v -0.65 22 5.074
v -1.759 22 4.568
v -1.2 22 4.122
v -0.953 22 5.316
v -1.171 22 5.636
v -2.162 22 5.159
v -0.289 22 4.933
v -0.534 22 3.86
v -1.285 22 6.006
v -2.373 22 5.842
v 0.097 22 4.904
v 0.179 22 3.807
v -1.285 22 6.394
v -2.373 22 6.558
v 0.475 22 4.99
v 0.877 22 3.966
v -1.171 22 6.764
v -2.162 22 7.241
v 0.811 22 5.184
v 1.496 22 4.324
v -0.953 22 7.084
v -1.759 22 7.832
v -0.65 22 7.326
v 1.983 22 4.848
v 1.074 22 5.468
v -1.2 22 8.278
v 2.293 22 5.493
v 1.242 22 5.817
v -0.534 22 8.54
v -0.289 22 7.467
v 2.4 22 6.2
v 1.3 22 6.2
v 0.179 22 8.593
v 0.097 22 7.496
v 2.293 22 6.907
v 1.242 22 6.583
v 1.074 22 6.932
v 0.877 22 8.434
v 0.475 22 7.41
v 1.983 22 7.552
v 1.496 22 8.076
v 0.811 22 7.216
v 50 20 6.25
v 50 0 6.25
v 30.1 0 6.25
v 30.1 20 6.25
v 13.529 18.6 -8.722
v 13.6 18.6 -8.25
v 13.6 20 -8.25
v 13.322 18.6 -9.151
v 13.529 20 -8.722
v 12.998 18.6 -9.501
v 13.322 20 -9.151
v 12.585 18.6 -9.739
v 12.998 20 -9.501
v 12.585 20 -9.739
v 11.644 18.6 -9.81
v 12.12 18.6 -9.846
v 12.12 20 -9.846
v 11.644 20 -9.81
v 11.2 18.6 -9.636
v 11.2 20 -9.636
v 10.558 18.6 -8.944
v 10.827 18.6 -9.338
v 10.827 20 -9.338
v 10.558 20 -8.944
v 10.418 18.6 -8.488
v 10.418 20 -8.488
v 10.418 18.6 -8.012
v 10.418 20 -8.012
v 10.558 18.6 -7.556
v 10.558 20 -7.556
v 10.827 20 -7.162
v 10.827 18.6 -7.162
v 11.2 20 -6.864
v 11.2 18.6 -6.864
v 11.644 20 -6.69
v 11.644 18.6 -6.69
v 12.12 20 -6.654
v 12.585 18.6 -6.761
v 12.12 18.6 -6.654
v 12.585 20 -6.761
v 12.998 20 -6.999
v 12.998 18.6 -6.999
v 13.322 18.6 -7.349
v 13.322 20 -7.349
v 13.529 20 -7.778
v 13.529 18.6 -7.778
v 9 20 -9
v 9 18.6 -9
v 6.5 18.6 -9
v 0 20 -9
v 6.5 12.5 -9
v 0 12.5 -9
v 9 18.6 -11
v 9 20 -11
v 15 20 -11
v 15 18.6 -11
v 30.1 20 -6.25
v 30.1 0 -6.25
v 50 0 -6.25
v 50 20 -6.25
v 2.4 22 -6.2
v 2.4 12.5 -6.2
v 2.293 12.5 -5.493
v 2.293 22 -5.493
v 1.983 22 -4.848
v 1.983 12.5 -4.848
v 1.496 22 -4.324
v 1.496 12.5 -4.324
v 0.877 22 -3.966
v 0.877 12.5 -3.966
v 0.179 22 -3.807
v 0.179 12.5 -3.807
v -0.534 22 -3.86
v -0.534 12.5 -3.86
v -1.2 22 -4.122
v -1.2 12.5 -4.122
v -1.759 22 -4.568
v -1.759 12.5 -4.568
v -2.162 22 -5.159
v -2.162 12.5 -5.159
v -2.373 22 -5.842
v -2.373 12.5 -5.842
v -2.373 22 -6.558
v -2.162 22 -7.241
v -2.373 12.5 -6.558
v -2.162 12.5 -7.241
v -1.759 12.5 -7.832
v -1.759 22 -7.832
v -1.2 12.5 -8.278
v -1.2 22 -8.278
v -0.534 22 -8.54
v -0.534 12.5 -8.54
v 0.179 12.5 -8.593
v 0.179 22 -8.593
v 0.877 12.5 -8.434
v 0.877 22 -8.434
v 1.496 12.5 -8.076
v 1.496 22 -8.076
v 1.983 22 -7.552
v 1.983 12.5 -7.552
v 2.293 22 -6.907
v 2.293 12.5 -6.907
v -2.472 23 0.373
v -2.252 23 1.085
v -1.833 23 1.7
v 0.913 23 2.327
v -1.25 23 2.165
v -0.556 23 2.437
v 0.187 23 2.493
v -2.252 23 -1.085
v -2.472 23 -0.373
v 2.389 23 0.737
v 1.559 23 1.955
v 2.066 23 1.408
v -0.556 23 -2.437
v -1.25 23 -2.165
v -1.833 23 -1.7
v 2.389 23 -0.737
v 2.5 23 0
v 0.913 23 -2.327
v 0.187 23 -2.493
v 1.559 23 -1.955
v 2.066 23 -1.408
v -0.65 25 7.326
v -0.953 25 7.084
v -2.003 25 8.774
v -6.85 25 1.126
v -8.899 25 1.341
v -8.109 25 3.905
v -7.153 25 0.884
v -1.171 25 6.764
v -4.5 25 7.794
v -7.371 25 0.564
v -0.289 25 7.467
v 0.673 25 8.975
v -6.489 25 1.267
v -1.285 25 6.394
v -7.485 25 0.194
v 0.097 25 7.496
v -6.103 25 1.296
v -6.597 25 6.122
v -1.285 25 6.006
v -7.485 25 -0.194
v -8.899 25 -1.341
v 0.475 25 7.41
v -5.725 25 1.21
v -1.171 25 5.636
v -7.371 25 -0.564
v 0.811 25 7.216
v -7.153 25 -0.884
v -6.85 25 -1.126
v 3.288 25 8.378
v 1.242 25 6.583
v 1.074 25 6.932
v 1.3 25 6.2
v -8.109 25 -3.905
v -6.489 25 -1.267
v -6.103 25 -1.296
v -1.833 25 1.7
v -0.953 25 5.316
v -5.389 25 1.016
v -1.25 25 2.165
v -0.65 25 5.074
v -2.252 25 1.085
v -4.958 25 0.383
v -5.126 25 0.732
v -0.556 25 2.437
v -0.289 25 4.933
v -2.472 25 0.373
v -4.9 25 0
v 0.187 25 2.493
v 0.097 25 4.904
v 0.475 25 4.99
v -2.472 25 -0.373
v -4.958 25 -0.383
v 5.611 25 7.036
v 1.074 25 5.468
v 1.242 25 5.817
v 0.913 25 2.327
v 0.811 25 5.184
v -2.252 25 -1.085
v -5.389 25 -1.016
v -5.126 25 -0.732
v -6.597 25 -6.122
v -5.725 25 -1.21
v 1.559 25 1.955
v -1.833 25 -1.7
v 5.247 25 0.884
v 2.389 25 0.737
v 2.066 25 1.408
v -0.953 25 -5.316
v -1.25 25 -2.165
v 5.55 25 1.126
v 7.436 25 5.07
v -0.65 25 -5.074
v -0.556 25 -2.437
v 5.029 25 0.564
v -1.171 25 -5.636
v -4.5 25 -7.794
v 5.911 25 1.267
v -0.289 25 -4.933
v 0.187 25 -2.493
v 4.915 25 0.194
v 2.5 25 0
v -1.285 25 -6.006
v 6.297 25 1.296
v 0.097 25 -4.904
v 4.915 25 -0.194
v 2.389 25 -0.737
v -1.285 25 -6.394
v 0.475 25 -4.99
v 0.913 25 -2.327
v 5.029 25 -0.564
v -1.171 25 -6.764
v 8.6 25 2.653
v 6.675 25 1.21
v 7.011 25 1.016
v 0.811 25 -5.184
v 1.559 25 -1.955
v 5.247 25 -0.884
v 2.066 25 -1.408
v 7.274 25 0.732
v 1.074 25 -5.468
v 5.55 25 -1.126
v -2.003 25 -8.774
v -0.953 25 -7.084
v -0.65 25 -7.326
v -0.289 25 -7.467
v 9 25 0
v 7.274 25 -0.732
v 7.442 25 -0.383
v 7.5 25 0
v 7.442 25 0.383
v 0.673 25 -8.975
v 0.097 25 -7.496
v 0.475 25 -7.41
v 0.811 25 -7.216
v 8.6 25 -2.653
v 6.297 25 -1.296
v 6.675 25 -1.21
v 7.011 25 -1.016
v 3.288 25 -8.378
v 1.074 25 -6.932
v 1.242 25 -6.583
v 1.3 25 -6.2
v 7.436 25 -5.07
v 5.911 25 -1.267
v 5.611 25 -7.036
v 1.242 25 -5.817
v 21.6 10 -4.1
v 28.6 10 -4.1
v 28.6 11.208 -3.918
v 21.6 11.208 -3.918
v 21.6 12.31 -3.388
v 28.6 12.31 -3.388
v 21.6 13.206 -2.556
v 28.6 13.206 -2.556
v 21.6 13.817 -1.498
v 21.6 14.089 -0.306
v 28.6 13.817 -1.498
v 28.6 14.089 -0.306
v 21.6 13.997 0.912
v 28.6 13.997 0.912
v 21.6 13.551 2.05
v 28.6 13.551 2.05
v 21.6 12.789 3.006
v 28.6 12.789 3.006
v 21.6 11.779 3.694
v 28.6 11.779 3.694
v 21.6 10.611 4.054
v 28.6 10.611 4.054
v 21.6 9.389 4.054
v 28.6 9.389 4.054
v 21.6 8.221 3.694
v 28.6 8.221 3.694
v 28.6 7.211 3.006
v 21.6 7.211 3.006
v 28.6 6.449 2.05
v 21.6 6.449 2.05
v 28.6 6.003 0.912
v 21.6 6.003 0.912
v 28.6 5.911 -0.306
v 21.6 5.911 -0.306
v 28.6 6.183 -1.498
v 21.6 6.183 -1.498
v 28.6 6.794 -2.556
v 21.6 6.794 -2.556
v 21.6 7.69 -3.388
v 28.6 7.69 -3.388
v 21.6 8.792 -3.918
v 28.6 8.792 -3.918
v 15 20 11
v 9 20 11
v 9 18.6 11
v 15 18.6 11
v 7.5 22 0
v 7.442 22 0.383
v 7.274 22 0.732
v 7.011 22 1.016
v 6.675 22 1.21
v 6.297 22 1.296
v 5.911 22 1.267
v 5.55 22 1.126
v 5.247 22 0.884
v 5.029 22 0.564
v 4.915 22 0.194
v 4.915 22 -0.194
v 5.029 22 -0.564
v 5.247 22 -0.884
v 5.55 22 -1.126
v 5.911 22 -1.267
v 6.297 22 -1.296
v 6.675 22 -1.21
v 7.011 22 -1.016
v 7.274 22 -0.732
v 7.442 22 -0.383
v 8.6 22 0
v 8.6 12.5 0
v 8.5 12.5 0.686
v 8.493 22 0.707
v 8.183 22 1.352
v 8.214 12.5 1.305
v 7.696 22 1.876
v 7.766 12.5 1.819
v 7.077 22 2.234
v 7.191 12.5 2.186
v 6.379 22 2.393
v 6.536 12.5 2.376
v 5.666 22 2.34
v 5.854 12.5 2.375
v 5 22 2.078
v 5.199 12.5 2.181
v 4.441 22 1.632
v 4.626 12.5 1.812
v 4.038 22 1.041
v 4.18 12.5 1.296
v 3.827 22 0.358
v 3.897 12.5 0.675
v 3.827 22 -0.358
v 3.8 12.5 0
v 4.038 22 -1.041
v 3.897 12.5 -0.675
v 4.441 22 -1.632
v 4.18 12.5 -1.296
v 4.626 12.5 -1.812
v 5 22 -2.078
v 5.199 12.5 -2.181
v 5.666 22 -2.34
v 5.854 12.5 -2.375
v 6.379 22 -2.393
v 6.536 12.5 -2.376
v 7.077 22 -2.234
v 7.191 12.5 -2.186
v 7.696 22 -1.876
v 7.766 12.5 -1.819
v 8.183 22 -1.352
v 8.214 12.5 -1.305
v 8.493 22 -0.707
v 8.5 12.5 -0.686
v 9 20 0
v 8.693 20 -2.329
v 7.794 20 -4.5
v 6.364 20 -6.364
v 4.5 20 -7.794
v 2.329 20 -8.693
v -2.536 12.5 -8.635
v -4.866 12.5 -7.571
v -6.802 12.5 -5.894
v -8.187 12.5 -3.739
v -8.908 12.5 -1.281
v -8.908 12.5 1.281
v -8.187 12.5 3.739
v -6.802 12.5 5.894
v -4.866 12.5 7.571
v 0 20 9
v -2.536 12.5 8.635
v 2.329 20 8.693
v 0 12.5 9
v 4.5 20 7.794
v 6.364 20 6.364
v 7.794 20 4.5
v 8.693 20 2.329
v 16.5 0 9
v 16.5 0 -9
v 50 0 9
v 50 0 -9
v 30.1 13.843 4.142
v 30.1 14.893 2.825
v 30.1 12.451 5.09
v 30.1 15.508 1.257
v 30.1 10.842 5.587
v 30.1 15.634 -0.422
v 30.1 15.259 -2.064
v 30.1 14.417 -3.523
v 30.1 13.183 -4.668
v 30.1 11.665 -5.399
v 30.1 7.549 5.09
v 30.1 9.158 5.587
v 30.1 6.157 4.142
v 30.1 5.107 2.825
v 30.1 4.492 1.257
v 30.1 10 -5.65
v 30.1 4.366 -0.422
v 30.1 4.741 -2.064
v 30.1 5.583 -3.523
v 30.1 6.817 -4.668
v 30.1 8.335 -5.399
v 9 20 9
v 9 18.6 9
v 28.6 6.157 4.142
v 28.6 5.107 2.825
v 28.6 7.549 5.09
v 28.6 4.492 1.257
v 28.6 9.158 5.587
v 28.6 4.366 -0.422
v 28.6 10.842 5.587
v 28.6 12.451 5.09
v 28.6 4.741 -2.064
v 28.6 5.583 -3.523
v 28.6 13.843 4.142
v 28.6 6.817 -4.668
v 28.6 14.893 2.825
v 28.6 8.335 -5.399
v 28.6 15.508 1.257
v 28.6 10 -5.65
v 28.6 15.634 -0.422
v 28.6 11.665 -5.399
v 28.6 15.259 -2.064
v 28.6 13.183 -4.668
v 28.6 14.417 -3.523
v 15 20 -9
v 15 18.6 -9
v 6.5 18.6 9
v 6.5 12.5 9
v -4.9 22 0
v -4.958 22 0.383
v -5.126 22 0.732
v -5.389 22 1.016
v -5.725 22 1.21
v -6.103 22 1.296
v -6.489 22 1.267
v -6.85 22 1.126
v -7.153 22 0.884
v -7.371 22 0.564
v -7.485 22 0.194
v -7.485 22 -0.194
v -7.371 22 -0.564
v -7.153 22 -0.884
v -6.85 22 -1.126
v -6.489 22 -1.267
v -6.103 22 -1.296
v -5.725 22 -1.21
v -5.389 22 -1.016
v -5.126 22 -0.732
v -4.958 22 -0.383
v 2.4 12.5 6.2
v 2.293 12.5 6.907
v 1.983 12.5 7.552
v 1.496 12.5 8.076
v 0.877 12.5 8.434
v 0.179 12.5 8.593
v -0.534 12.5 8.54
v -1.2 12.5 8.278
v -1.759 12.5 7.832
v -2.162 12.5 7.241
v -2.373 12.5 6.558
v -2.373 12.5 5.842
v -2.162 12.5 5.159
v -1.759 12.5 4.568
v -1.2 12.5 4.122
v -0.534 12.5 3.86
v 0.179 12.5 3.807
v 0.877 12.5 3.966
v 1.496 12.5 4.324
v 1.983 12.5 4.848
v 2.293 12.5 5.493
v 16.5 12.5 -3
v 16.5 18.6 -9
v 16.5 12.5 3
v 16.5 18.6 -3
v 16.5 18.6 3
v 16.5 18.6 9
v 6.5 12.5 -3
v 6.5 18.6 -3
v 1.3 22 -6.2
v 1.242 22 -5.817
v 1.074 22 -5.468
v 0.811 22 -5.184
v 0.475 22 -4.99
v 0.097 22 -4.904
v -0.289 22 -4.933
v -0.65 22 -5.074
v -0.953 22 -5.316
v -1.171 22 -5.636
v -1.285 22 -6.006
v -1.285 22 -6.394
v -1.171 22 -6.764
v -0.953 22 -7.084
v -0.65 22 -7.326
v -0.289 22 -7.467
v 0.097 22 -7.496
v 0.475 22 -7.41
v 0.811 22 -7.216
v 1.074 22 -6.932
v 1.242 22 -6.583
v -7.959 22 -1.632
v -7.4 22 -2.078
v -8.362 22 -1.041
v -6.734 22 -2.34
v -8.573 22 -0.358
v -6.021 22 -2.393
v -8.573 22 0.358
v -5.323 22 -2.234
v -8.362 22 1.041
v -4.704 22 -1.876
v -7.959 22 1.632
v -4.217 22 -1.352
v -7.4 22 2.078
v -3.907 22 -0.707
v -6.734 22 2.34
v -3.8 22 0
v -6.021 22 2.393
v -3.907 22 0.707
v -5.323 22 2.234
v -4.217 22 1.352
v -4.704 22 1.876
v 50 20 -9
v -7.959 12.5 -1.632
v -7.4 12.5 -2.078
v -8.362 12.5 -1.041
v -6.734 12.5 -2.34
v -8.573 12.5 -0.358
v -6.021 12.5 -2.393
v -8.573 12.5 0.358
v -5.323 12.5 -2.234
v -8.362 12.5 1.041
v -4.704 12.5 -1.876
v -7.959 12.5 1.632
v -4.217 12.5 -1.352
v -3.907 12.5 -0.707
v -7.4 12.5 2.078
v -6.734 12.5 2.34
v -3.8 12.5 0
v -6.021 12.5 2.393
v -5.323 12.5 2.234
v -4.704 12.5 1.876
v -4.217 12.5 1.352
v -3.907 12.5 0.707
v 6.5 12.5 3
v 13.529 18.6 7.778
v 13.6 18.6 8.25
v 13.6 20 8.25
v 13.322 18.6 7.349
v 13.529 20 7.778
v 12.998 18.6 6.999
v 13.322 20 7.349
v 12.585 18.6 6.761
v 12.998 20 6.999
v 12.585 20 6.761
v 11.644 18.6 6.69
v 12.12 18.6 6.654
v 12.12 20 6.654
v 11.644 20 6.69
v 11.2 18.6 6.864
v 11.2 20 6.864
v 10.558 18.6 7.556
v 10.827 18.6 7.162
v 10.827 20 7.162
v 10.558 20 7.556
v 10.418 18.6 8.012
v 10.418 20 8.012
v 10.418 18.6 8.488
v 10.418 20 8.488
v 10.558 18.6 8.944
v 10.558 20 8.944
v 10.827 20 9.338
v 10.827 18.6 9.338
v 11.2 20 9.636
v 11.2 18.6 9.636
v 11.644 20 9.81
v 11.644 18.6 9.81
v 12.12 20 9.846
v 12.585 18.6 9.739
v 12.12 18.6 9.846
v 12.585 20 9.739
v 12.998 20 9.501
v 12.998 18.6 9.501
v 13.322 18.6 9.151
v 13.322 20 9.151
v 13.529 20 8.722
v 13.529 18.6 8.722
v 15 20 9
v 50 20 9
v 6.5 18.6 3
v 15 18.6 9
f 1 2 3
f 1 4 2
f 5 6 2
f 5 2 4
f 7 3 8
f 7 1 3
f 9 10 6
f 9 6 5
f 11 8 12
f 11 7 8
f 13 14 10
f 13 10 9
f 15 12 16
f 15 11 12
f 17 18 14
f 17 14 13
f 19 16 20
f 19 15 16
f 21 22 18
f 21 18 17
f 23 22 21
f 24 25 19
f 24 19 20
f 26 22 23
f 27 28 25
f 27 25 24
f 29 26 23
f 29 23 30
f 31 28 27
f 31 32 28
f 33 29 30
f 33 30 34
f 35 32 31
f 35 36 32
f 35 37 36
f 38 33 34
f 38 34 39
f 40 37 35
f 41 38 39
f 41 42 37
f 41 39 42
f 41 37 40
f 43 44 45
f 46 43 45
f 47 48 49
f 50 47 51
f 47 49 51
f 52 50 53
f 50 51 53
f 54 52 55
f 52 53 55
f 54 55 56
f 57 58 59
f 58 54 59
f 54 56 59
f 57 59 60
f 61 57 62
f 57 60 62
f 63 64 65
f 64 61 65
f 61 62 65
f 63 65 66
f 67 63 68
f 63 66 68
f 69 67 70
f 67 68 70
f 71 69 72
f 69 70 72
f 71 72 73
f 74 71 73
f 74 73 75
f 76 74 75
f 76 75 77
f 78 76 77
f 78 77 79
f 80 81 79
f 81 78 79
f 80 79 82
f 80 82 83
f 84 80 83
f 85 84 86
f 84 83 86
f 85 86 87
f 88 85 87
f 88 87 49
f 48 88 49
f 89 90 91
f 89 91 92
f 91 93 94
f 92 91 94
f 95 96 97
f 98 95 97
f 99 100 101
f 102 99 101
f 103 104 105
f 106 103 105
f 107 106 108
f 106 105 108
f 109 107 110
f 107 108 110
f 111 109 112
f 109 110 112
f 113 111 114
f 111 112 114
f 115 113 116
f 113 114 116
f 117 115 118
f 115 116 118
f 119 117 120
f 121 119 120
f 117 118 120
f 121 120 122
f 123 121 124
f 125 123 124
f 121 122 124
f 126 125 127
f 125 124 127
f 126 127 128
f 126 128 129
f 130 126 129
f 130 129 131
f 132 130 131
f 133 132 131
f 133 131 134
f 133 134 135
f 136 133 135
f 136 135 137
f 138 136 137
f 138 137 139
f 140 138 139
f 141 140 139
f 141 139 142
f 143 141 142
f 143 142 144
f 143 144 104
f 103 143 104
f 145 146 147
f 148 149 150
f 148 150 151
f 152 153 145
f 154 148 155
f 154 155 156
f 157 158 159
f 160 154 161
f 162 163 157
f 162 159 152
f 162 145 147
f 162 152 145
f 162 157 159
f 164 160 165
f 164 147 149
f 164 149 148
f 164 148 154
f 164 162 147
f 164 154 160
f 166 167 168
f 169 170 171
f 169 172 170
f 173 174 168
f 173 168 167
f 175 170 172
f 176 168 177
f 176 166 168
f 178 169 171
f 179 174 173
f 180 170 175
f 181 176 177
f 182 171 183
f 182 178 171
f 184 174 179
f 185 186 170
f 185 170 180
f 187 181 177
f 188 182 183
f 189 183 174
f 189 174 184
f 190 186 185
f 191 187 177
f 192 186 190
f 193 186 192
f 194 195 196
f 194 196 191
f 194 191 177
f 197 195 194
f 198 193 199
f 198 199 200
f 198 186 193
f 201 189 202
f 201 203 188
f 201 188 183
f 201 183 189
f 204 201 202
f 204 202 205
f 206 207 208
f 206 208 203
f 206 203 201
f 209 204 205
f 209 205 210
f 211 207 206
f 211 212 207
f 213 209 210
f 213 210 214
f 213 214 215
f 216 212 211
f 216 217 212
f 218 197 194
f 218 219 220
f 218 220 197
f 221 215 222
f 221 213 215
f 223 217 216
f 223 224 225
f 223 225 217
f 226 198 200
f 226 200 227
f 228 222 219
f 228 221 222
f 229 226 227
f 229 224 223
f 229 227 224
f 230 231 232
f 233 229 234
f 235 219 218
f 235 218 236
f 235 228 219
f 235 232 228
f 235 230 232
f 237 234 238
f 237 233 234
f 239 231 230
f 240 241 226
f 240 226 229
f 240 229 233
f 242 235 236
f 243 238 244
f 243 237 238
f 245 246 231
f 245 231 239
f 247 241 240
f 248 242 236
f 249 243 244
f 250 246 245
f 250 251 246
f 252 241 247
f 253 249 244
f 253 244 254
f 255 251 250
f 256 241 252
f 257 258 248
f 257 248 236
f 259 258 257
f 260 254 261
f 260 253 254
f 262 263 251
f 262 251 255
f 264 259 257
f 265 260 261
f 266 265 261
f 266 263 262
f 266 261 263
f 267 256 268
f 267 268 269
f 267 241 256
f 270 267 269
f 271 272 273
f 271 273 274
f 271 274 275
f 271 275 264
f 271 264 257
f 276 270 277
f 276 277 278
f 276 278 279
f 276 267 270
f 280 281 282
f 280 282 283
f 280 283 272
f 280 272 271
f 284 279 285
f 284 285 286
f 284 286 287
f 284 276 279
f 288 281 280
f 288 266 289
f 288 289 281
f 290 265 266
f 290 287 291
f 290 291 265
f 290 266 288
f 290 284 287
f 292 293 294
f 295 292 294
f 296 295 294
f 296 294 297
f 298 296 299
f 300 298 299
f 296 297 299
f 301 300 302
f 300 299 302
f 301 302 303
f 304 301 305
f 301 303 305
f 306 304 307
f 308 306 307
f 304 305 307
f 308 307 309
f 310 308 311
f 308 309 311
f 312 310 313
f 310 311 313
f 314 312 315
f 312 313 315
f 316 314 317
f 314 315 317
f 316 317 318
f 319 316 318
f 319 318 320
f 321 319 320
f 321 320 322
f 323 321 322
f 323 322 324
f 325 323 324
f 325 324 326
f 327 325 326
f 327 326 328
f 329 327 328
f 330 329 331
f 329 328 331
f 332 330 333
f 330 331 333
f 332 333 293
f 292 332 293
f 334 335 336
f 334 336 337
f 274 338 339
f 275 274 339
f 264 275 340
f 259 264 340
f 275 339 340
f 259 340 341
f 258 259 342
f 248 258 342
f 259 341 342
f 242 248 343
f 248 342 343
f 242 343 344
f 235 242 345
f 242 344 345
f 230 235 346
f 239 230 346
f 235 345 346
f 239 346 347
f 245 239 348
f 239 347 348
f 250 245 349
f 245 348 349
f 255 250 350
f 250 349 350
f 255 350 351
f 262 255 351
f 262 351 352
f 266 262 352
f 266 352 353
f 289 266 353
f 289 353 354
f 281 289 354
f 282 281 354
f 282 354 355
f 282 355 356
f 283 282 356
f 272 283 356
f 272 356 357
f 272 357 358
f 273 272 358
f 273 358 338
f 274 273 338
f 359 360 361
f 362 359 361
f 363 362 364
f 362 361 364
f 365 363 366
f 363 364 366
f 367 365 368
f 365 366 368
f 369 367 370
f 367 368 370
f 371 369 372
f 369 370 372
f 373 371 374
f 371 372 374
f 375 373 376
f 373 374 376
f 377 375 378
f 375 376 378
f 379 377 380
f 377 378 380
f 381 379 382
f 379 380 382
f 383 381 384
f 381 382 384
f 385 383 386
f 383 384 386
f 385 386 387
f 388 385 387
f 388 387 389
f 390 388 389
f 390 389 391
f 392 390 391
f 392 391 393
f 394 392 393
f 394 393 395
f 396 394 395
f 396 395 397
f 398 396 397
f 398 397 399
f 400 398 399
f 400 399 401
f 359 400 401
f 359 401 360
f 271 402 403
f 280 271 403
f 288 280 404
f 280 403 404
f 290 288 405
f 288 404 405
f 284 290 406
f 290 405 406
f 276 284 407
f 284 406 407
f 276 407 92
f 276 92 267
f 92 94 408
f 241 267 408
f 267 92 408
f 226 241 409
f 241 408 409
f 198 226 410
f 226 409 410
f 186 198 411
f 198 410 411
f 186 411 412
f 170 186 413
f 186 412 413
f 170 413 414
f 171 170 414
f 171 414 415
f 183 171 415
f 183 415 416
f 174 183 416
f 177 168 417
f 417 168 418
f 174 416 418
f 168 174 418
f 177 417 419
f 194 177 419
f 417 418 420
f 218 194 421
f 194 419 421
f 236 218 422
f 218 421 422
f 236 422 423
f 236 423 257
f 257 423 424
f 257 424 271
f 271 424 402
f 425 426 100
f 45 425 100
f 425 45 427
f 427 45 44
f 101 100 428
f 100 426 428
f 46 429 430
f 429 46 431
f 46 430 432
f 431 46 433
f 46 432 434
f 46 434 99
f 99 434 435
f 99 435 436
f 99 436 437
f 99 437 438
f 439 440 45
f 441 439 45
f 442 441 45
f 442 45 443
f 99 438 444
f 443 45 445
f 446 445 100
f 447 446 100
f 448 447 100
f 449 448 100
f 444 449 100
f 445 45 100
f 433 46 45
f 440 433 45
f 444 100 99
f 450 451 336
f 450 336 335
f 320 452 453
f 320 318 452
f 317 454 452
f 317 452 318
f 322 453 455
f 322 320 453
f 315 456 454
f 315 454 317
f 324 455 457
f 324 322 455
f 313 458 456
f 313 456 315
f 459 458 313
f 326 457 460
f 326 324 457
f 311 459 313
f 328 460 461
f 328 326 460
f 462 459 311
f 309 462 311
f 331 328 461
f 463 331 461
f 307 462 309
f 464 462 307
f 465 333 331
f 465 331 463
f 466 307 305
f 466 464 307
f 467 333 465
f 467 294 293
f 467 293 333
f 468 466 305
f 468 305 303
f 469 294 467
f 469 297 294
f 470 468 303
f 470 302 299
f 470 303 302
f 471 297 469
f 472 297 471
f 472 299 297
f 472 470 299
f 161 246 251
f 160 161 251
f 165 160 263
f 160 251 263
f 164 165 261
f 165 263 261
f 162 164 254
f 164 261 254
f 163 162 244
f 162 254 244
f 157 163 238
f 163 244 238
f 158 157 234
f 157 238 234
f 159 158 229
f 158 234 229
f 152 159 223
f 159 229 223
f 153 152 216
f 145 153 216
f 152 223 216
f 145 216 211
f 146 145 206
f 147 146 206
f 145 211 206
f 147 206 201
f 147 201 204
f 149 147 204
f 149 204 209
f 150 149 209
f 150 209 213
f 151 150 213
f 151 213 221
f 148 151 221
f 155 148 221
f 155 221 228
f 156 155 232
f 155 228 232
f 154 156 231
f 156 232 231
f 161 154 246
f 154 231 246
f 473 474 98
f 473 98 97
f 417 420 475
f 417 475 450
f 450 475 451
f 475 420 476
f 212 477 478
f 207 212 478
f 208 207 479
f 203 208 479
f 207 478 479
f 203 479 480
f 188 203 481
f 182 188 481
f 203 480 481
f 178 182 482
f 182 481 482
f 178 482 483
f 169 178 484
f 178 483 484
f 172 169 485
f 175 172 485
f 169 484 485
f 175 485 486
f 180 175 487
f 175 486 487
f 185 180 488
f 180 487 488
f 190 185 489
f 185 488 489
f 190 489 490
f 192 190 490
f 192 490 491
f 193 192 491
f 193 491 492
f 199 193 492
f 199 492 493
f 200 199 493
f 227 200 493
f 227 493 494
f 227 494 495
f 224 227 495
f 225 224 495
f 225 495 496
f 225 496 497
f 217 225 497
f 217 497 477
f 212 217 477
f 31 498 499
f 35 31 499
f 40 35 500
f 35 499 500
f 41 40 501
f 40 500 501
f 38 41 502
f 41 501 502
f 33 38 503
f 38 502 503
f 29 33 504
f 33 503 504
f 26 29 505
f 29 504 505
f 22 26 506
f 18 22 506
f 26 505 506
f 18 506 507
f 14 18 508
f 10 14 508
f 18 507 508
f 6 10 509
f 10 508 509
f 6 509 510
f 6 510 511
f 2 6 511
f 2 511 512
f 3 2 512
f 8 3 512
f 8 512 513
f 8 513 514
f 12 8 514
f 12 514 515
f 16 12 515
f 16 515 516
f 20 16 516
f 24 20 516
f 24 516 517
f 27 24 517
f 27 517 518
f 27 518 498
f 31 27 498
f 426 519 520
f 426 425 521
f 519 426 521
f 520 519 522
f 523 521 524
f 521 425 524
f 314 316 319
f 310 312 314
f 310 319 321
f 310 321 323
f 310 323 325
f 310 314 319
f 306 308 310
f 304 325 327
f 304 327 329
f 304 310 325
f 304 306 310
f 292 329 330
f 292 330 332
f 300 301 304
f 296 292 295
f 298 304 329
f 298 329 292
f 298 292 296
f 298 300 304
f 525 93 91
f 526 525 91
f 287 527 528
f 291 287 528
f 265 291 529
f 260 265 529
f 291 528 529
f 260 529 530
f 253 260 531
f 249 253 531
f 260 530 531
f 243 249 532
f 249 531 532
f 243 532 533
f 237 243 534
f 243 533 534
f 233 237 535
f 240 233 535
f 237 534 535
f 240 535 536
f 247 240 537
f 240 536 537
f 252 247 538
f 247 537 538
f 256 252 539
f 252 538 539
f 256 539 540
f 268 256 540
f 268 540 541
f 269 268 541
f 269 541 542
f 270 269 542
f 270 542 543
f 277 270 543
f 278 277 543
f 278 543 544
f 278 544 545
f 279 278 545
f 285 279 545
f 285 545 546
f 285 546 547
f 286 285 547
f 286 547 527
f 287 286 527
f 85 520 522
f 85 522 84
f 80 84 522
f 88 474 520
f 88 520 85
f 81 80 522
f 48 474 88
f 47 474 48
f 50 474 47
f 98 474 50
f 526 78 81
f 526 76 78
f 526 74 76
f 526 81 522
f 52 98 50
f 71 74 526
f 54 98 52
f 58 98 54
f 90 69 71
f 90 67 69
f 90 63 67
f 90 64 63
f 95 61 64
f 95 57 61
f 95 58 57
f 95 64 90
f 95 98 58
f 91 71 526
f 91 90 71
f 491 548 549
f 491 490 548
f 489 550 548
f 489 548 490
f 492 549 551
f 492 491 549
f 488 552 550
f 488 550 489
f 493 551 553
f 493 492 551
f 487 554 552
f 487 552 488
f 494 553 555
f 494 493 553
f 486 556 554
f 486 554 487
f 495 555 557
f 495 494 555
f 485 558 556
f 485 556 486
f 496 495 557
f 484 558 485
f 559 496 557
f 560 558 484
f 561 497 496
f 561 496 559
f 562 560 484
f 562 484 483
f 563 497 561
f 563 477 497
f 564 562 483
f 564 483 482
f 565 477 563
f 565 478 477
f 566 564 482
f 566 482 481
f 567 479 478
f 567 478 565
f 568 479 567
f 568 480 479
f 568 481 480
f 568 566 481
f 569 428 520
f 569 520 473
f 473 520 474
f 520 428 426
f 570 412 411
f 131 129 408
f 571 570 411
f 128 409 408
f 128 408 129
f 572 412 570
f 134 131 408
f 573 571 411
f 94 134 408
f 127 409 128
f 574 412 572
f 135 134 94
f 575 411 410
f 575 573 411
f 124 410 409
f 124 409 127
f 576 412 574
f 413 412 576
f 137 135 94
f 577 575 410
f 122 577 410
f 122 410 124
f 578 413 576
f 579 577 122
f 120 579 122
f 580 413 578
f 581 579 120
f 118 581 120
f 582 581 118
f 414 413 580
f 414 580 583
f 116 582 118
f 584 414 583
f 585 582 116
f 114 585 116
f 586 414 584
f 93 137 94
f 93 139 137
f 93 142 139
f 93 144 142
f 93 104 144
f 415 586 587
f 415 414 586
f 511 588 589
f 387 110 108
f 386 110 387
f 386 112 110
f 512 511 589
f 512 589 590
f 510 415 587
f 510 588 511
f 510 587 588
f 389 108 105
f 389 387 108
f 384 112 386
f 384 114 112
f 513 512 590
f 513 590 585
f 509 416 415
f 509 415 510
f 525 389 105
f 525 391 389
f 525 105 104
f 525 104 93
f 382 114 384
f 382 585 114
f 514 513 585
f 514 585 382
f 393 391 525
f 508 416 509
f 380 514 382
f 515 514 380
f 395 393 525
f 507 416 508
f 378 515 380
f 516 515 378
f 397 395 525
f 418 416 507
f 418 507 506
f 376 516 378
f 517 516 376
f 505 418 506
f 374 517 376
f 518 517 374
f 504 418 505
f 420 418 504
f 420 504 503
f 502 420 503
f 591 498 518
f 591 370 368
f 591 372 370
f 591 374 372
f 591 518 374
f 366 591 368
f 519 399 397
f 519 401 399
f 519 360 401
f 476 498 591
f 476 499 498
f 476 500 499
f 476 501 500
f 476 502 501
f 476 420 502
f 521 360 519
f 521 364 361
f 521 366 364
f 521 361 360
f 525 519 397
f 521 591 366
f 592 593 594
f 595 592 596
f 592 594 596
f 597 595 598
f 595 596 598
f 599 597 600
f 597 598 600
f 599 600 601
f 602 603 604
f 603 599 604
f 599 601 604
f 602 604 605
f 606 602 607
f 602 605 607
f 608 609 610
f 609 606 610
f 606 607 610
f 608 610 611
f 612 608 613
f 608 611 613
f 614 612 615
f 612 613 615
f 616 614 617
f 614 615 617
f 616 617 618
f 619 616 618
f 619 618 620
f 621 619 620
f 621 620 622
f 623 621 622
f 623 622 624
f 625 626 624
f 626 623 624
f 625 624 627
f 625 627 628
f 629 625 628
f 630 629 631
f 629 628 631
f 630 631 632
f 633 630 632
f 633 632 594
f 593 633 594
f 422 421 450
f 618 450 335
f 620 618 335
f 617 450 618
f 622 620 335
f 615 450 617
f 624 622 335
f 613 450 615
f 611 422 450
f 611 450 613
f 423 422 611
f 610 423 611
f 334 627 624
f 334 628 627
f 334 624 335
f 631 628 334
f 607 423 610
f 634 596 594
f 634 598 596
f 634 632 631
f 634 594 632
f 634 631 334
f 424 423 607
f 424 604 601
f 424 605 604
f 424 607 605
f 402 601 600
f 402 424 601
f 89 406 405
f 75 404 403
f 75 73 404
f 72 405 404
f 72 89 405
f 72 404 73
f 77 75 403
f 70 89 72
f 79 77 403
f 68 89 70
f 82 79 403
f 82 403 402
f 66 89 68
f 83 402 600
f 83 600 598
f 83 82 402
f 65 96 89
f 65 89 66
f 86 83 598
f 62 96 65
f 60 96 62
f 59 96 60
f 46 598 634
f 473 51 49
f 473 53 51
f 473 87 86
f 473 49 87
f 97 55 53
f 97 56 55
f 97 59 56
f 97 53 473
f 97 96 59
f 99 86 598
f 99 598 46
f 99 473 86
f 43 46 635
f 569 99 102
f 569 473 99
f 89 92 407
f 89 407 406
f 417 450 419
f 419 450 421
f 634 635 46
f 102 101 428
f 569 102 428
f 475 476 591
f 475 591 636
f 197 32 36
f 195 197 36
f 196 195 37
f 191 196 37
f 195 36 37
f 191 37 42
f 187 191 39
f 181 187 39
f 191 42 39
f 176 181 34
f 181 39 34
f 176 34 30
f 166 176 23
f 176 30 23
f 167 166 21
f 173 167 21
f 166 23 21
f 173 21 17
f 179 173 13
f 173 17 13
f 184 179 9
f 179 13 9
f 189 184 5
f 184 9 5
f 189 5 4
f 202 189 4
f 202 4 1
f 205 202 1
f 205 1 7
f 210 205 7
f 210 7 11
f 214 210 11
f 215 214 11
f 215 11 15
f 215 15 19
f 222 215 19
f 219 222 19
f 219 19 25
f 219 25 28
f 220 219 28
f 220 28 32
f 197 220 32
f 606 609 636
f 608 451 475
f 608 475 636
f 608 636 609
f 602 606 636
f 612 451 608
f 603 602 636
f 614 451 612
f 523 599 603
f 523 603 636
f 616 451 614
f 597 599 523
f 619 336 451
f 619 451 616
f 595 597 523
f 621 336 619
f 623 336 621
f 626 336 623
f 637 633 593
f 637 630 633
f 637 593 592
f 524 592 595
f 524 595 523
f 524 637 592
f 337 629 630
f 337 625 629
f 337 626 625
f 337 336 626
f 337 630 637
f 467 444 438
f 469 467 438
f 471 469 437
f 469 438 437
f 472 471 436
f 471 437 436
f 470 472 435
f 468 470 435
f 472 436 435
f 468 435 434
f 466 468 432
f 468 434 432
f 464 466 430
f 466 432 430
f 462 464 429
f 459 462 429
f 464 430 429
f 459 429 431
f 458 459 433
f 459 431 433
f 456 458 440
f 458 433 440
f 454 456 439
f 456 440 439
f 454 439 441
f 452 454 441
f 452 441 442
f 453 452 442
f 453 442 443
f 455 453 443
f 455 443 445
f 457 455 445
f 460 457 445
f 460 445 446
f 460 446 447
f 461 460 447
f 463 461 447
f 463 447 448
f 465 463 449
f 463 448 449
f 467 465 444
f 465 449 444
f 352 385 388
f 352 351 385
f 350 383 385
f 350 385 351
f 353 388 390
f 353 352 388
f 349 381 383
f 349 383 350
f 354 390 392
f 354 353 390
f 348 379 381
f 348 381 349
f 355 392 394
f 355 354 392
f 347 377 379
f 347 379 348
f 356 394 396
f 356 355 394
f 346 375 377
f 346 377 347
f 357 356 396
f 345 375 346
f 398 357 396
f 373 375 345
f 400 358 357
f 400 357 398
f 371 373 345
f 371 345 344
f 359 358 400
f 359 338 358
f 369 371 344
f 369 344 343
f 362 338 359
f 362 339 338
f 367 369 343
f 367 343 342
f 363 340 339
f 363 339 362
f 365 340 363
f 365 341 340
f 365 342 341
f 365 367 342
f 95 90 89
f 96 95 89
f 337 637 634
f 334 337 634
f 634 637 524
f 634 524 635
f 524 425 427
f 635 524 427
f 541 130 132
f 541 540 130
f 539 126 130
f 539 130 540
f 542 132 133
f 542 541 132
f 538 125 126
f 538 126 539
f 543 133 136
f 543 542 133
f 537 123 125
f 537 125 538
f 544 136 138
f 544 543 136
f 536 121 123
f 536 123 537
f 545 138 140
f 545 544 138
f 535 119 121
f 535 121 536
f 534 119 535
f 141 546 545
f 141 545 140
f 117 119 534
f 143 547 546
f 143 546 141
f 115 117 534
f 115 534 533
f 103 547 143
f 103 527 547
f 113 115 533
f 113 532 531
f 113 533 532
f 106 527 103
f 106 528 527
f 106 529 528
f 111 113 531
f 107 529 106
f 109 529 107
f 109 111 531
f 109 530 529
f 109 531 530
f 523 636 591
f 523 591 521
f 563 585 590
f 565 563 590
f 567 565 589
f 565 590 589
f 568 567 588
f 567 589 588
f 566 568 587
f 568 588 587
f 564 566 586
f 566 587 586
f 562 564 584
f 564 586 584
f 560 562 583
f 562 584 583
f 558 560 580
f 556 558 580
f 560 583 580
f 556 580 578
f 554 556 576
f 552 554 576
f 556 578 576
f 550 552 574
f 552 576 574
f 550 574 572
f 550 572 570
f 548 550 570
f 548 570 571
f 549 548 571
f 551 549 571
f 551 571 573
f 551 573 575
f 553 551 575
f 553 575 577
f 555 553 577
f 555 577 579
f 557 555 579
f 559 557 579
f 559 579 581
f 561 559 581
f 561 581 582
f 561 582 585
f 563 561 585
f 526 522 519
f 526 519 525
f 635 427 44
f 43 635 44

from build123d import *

# Parameters (mm, degrees)
SKETCH1_R                = 9
BOSS_EXTRUDE1_DEPTH      = 25
SKETCH2_R                = 2.4
CUT_EXTRUDE1_DEPTH       = 22
SKETCH4_R                = 1.3
CUT_EXTRUDE2_DEPTH       = 26
SKETCH19_R               = 2.5
CUT_EXTRUDE10_DEPTH      = 2
BOSS_EXTRUDE2_DEPTH      = 20
SKETCH8_R                = 5.65
CUT_EXTRUDE3_DEPTH       = 20.9
CUT_EXTRUDE3_DEPTH_BACK  = 1.5
CUT_EXTRUDE5_DEPTH       = 12.5
FILLET1_R                = 5
SKETCH11_R               = 4.1
CUT_EXTRUDE6_DEPTH       = 7
FILLET4_R                = 0.5
SKETCH12_W               = 6
SKETCH12_H               = 1.4
BOSS_EXTRUDE3_DEPTH      = 2
BOSS_EXTRUDE3_DEPTH_BACK = 20
SKETCH13_R               = 1.6
CUT_EXTRUDE7_DEPTH       = 21
SKETCH14_W               = 10
SKETCH14_H               = 18.6
CUT_EXTRUDE8_DEPTH       = 6
SKETCH15_W               = 10
SKETCH15_H               = 18.6
CUT_EXTRUDE9_DEPTH       = 6
CUT_EXTRUDE11_REACH      = 16
SKETCH20_W               = 10
SKETCH20_H               = 12.5


with BuildPart() as part:
    # Sketch1 → Boss-Extrude1 (new body)
    with BuildSketch(Plane(origin=(0, 0, 0), x_dir=(1, 0, 0), z_dir=(0, 1, 0))):
        Circle(SKETCH1_R)
    extrude(amount=BOSS_EXTRUDE1_DEPTH)

    # Sketch2 → Cut-Extrude1 (cut)
    with BuildSketch(Plane.XZ):
        with Locations((0, 6.2)):
            Circle(SKETCH2_R)
        with Locations((6.2, 0)):
            Circle(SKETCH2_R)
        with Locations((0, -6.2)):
            Circle(SKETCH2_R)
        with Locations((-6.2, 0)):
            Circle(SKETCH2_R)
    extrude(amount=-CUT_EXTRUDE1_DEPTH, mode=Mode.SUBTRACT)

    # Sketch4 → Cut-Extrude2 (cut, through all)
    with BuildSketch(Plane.XZ):
        with Locations((0, 6.2)):
            Circle(SKETCH4_R)
        with Locations((6.2, 0)):
            Circle(SKETCH4_R)
        with Locations((0, -6.2)):
            Circle(SKETCH4_R)
        with Locations((-6.2, 0)):
            Circle(SKETCH4_R)
    extrude(amount=-CUT_EXTRUDE2_DEPTH, mode=Mode.SUBTRACT)

    # Sketch19 → Cut-Extrude10 (cut)
    with BuildSketch(Plane(origin=(0, 25, 0), x_dir=(1, 0, 0), z_dir=(0, 1, 0))):
        Circle(SKETCH19_R)
    extrude(amount=-CUT_EXTRUDE10_DEPTH, mode=Mode.SUBTRACT)

    # Sketch6 → Boss-Extrude2 (add)
    with BuildSketch(Plane(origin=(0, 0, 0), x_dir=(1, 0, 0), z_dir=(0, 1, 0))):
        with BuildLine():
            Line((30.1, 6.25), (50, 6.25))
            Line((50, 6.25), (50, 9))
            Line((50, 9), (0, 9))
            ThreePointArc((0, 9), (9, 0), (0, -9))
            Line((0, -9), (50, -9))
            Line((50, -9), (50, -6.25))
            Line((50, -6.25), (30.1, -6.25))
            Line((30.1, -6.25), (30.1, 6.25))
        make_face()
    extrude(amount=BOSS_EXTRUDE2_DEPTH)

    # Sketch8 → Cut-Extrude3 (cut, two sides)
    with BuildSketch(Plane(origin=(30.1, 0, 0), x_dir=(0, 0, -1), z_dir=(1, 0, 0))) as cut_extrude3_sk:
        with Locations((0, 10)):
            Circle(SKETCH8_R)
    extrude(amount=CUT_EXTRUDE3_DEPTH, mode=Mode.SUBTRACT)
    extrude(cut_extrude3_sk.sketch, amount=-CUT_EXTRUDE3_DEPTH_BACK, mode=Mode.SUBTRACT)

    # Sketch10 → Cut-Extrude5 (cut)
    with BuildSketch(Plane.XZ):
        with BuildLine():
            Line((9, 0), (9, 9))
            Line((9, 9), (0, 9))
            ThreePointArc((0, 9), (-9, 0), (0, -9))
            Line((0, -9), (9, -9))
            Line((9, -9), (9, 0))
        make_face()
    extrude(amount=-CUT_EXTRUDE5_DEPTH, mode=Mode.SUBTRACT)

    # Fillet1
    fillet1_edges = [part.edges().sort_by_distance(p)[0] for p in [
        (9, 0, 0),
    ]]
    fillet(fillet1_edges, radius=FILLET1_R)

    # Sketch11 → Cut-Extrude6 (cut)
    with BuildSketch(Plane(origin=(28.6, 0, 0), x_dir=(0, 0, -1), z_dir=(1, 0, 0))):
        with Locations((0, 10)):
            Circle(SKETCH11_R)
    extrude(amount=-CUT_EXTRUDE6_DEPTH, mode=Mode.SUBTRACT)

    # Fillet4
    fillet4_edges = [part.edges().sort_by_distance(p)[0] for p in [
        (9, 12.5, 0),
    ]]
    fillet(fillet4_edges, radius=FILLET4_R)

    # Sketch12 → Boss-Extrude3 (add, two sides)
    with BuildSketch(Plane.XY.offset(9)) as boss_extrude3_sk:
        with Locations((12, 19.3)):
            Rectangle(SKETCH12_W, SKETCH12_H)
    extrude(amount=BOSS_EXTRUDE3_DEPTH)
    extrude(boss_extrude3_sk.sketch, amount=-BOSS_EXTRUDE3_DEPTH_BACK)

    # Sketch13 → Cut-Extrude7 (cut, through all)
    with BuildSketch(Plane(origin=(0, 20, 0), x_dir=(1, 0, 0), z_dir=(0, 1, 0))):
        with Locations((12, 8.25)):
            Circle(SKETCH13_R)
        with Locations((12, -8.25)):
            Circle(SKETCH13_R)
    extrude(amount=-CUT_EXTRUDE7_DEPTH, mode=Mode.SUBTRACT)

    # Sketch14 → Cut-Extrude8 (cut)
    with BuildSketch(Plane.XY.offset(9)):
        with Locations((11.5, 9.3)):
            Rectangle(SKETCH14_W, SKETCH14_H)
    extrude(amount=-CUT_EXTRUDE8_DEPTH, mode=Mode.SUBTRACT)

    # Sketch15 → Cut-Extrude9 (cut)
    with BuildSketch(Plane(origin=(0, 0, -9), x_dir=(-1, 0, 0), z_dir=(0, 0, -1))):
        with Locations((-11.5, 9.3)):
            Rectangle(SKETCH15_W, SKETCH15_H)
    extrude(amount=-CUT_EXTRUDE9_DEPTH, mode=Mode.SUBTRACT)

    # Sketch20 → Cut-Extrude11 (cut, up to next)
    with BuildSketch(Plane(origin=(0, 0, -3), x_dir=(-1, 0, 0), z_dir=(0, 0, -1)), mode=Mode.PRIVATE) as cut_extrude11_sk1:
        with Locations((-11.5, 6.25)):
            Rectangle(SKETCH20_W, SKETCH20_H)
    cut_extrude11_tool1 = extrude(cut_extrude11_sk1.sketch, amount=-CUT_EXTRUDE11_REACH, mode=Mode.PRIVATE) & part.part
    add(cut_extrude11_tool1.solids().sort_by_distance((11.5, 6.25, -3))[0], mode=Mode.SUBTRACT)


solid = part.part
